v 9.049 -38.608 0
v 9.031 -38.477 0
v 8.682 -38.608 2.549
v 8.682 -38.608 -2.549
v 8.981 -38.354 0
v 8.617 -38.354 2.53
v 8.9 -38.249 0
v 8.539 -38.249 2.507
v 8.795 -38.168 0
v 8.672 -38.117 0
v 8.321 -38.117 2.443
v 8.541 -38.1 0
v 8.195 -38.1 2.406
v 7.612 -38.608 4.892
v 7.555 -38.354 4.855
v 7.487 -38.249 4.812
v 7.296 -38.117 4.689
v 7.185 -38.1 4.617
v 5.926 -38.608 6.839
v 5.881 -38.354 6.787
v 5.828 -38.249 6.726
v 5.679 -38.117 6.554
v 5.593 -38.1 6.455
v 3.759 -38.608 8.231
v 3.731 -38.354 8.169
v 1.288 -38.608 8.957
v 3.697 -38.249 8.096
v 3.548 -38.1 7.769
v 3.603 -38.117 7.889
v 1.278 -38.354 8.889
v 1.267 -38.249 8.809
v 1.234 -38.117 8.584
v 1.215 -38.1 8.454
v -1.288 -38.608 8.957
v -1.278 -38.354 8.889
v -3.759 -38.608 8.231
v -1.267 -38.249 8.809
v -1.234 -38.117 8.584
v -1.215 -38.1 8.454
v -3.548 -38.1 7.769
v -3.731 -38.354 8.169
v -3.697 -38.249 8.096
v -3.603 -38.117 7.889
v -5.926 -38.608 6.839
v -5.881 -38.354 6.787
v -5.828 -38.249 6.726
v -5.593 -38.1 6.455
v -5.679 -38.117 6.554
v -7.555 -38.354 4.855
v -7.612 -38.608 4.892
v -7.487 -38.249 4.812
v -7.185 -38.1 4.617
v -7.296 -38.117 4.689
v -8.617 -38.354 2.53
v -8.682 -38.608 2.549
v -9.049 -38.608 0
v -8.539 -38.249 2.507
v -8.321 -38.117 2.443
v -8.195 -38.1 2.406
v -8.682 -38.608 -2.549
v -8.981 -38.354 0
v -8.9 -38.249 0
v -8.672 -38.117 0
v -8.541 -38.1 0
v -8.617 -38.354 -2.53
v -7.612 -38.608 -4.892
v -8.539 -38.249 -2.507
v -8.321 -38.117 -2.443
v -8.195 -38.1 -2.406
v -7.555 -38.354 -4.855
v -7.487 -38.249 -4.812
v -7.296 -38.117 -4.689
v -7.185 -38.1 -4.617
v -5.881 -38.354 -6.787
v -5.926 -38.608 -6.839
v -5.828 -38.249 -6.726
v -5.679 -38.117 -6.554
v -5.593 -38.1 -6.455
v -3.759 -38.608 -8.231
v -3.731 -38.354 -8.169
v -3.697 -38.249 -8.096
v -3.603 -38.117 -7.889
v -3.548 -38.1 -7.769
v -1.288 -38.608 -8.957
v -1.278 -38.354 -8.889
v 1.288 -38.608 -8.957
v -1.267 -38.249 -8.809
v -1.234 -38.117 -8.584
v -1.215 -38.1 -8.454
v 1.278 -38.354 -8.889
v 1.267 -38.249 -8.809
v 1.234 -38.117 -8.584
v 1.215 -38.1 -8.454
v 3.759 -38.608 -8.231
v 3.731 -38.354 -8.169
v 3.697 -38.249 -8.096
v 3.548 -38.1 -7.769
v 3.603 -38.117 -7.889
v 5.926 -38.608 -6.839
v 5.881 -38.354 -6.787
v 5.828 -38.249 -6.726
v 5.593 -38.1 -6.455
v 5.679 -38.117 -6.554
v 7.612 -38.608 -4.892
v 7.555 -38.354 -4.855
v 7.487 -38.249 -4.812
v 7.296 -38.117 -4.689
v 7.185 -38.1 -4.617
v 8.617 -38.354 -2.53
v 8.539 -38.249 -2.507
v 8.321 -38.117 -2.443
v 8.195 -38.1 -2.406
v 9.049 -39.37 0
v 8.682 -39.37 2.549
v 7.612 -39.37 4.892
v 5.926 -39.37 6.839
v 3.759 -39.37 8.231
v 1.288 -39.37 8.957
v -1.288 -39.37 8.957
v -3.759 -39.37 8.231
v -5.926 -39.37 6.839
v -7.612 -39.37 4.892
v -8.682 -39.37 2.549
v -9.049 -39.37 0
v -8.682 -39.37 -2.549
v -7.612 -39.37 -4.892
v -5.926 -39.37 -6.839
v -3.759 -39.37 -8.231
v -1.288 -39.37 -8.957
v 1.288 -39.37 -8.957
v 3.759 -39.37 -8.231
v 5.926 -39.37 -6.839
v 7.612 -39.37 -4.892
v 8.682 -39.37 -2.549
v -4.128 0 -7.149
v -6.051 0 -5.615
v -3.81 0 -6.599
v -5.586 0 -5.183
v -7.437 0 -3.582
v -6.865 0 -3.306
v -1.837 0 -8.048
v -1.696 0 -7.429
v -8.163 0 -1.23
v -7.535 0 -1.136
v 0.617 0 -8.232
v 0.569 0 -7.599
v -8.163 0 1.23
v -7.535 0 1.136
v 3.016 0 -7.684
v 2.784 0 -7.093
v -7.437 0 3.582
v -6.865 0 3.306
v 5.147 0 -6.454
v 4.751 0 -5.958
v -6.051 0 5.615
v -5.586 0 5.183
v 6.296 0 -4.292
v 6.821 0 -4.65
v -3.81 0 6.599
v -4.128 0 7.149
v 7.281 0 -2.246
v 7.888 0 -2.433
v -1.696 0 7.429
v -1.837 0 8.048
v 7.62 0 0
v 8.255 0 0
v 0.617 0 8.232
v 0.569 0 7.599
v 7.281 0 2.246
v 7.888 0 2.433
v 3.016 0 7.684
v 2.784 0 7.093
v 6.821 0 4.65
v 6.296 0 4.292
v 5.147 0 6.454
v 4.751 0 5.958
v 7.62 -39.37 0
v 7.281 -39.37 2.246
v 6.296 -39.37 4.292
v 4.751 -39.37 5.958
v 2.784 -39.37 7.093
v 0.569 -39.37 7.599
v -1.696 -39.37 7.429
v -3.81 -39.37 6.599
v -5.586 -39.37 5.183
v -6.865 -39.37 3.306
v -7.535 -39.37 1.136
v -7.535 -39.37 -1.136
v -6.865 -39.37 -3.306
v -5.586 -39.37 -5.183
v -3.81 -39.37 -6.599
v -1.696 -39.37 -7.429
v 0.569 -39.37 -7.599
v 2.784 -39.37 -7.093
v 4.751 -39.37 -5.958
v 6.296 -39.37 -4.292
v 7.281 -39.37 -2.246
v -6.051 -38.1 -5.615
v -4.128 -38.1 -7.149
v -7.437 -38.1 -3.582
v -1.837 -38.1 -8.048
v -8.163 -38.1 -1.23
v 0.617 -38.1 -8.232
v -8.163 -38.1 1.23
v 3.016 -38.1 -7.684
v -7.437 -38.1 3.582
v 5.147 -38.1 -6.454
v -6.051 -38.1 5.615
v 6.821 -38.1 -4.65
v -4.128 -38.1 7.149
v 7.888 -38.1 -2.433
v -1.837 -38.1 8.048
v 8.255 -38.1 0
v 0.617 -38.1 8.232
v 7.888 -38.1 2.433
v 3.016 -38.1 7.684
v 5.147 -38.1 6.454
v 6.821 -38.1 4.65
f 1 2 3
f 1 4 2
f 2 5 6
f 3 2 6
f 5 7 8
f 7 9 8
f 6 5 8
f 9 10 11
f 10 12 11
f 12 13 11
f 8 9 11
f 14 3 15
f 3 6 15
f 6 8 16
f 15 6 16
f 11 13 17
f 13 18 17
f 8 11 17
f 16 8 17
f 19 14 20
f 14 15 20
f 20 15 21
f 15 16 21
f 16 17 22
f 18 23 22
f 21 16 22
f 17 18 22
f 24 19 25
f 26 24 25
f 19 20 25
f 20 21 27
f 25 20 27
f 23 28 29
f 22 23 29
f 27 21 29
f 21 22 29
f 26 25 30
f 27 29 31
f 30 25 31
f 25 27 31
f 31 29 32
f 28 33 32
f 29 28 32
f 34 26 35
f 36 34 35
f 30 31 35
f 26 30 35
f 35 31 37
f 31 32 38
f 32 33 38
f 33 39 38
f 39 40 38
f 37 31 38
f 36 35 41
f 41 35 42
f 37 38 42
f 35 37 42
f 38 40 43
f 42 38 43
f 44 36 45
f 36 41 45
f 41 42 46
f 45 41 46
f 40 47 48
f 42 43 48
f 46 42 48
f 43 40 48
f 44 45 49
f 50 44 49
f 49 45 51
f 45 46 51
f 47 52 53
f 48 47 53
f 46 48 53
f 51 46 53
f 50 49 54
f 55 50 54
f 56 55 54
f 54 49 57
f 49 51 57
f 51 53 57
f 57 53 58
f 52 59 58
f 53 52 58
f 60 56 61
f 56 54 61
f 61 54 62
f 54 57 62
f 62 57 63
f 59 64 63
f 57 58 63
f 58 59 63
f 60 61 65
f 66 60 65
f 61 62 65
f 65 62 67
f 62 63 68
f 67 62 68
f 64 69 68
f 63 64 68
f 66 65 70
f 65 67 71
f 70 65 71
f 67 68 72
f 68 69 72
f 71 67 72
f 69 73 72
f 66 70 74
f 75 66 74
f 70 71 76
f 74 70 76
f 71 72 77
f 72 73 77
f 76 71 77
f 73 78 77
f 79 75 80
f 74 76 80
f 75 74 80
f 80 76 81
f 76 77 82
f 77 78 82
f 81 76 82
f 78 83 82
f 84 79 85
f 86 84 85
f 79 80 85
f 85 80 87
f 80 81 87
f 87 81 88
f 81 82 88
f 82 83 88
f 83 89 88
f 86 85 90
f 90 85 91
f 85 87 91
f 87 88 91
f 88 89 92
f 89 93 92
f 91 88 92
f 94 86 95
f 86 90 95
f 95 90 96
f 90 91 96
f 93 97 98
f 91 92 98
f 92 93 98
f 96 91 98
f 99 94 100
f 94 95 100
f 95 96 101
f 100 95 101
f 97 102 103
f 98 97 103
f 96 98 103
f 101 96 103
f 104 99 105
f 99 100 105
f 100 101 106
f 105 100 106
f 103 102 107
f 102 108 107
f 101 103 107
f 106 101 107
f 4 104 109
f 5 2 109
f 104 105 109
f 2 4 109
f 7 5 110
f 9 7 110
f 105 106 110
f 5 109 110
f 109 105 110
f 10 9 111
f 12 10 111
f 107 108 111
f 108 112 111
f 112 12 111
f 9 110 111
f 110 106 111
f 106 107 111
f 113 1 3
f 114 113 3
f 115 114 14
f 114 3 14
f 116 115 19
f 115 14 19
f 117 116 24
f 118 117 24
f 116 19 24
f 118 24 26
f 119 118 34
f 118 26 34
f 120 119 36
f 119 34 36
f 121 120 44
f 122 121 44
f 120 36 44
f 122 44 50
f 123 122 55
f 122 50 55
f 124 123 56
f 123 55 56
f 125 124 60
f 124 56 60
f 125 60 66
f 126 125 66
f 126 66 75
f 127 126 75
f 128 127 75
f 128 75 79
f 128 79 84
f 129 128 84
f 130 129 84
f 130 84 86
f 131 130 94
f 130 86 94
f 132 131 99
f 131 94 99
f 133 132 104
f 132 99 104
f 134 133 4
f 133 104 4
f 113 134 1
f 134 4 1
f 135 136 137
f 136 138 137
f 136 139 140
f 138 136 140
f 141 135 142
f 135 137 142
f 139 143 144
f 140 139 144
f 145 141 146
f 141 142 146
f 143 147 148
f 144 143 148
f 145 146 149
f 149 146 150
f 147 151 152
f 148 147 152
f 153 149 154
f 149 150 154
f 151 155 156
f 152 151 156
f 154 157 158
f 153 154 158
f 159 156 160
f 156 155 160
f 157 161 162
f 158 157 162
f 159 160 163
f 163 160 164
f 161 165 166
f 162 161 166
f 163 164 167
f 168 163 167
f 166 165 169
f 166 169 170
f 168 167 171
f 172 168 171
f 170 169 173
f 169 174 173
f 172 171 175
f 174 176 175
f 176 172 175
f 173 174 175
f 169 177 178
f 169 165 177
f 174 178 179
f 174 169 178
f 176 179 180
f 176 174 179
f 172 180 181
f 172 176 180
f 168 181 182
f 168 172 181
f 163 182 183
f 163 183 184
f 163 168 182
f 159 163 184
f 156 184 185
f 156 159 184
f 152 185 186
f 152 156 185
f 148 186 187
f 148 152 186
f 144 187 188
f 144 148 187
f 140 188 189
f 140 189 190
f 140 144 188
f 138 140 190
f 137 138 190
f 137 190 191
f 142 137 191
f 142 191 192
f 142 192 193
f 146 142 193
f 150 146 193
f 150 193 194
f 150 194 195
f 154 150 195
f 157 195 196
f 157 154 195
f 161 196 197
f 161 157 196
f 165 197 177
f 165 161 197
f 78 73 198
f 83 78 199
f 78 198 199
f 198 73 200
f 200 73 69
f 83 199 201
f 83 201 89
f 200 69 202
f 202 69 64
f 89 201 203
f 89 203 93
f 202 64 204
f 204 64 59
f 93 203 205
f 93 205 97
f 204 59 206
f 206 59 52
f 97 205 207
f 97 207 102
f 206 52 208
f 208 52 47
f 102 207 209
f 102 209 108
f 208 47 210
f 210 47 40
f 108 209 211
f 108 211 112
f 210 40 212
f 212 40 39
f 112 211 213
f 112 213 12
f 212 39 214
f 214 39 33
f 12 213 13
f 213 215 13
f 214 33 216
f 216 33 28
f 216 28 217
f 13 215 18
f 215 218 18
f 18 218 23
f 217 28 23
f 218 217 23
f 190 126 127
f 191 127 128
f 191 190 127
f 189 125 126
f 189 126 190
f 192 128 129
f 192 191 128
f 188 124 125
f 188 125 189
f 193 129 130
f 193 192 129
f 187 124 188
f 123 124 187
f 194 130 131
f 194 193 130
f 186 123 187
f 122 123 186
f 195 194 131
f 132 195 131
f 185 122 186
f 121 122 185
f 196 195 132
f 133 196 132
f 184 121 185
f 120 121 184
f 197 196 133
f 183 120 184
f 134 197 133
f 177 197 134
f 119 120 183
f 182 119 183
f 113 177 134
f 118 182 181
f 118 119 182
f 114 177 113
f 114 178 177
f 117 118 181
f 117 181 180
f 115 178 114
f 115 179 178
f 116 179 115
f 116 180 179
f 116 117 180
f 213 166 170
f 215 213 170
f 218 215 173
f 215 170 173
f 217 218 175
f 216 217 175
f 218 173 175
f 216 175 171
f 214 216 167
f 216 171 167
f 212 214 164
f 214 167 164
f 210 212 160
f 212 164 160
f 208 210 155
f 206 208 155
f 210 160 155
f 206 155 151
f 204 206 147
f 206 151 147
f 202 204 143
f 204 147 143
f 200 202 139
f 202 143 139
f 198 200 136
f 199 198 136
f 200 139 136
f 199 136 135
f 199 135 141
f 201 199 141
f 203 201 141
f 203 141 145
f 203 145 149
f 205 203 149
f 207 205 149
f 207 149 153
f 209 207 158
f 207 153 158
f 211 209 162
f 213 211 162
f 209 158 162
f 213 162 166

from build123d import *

# Parameters (mm, degrees)
F0_R     = 8.255
F0_R_2   = 7.62
F1_DEPTH = 38.1
F2_R     = 9.04875
F2_R_2   = 8.255
F2_R_3   = 7.62
F3_DEPTH = 1.27
F4_R     = 0.508


with BuildPart() as f1:
    # F0 (on Front) → F1 (new body)
    with BuildSketch(Plane.XZ):
        Circle(F0_R)
        Circle(F0_R_2, mode=Mode.SUBTRACT)
    extrude(amount=F1_DEPTH)

    # F2 (on face) → F3 (join)
    with BuildSketch(Plane.XZ.offset(38.1)):
        Circle(F2_R)
        Circle(F2_R_2, mode=Mode.SUBTRACT)
        Circle(F2_R_2)
        Circle(F2_R_3, mode=Mode.SUBTRACT)
    extrude(amount=F3_DEPTH)

    # F4
    f4_edges = [f1.edges().sort_by_distance(p)[0] for p in [
        (-9.04875, -38.1, 0),
    ]]
    fillet(f4_edges, radius=F4_R)


solid = f1.part
